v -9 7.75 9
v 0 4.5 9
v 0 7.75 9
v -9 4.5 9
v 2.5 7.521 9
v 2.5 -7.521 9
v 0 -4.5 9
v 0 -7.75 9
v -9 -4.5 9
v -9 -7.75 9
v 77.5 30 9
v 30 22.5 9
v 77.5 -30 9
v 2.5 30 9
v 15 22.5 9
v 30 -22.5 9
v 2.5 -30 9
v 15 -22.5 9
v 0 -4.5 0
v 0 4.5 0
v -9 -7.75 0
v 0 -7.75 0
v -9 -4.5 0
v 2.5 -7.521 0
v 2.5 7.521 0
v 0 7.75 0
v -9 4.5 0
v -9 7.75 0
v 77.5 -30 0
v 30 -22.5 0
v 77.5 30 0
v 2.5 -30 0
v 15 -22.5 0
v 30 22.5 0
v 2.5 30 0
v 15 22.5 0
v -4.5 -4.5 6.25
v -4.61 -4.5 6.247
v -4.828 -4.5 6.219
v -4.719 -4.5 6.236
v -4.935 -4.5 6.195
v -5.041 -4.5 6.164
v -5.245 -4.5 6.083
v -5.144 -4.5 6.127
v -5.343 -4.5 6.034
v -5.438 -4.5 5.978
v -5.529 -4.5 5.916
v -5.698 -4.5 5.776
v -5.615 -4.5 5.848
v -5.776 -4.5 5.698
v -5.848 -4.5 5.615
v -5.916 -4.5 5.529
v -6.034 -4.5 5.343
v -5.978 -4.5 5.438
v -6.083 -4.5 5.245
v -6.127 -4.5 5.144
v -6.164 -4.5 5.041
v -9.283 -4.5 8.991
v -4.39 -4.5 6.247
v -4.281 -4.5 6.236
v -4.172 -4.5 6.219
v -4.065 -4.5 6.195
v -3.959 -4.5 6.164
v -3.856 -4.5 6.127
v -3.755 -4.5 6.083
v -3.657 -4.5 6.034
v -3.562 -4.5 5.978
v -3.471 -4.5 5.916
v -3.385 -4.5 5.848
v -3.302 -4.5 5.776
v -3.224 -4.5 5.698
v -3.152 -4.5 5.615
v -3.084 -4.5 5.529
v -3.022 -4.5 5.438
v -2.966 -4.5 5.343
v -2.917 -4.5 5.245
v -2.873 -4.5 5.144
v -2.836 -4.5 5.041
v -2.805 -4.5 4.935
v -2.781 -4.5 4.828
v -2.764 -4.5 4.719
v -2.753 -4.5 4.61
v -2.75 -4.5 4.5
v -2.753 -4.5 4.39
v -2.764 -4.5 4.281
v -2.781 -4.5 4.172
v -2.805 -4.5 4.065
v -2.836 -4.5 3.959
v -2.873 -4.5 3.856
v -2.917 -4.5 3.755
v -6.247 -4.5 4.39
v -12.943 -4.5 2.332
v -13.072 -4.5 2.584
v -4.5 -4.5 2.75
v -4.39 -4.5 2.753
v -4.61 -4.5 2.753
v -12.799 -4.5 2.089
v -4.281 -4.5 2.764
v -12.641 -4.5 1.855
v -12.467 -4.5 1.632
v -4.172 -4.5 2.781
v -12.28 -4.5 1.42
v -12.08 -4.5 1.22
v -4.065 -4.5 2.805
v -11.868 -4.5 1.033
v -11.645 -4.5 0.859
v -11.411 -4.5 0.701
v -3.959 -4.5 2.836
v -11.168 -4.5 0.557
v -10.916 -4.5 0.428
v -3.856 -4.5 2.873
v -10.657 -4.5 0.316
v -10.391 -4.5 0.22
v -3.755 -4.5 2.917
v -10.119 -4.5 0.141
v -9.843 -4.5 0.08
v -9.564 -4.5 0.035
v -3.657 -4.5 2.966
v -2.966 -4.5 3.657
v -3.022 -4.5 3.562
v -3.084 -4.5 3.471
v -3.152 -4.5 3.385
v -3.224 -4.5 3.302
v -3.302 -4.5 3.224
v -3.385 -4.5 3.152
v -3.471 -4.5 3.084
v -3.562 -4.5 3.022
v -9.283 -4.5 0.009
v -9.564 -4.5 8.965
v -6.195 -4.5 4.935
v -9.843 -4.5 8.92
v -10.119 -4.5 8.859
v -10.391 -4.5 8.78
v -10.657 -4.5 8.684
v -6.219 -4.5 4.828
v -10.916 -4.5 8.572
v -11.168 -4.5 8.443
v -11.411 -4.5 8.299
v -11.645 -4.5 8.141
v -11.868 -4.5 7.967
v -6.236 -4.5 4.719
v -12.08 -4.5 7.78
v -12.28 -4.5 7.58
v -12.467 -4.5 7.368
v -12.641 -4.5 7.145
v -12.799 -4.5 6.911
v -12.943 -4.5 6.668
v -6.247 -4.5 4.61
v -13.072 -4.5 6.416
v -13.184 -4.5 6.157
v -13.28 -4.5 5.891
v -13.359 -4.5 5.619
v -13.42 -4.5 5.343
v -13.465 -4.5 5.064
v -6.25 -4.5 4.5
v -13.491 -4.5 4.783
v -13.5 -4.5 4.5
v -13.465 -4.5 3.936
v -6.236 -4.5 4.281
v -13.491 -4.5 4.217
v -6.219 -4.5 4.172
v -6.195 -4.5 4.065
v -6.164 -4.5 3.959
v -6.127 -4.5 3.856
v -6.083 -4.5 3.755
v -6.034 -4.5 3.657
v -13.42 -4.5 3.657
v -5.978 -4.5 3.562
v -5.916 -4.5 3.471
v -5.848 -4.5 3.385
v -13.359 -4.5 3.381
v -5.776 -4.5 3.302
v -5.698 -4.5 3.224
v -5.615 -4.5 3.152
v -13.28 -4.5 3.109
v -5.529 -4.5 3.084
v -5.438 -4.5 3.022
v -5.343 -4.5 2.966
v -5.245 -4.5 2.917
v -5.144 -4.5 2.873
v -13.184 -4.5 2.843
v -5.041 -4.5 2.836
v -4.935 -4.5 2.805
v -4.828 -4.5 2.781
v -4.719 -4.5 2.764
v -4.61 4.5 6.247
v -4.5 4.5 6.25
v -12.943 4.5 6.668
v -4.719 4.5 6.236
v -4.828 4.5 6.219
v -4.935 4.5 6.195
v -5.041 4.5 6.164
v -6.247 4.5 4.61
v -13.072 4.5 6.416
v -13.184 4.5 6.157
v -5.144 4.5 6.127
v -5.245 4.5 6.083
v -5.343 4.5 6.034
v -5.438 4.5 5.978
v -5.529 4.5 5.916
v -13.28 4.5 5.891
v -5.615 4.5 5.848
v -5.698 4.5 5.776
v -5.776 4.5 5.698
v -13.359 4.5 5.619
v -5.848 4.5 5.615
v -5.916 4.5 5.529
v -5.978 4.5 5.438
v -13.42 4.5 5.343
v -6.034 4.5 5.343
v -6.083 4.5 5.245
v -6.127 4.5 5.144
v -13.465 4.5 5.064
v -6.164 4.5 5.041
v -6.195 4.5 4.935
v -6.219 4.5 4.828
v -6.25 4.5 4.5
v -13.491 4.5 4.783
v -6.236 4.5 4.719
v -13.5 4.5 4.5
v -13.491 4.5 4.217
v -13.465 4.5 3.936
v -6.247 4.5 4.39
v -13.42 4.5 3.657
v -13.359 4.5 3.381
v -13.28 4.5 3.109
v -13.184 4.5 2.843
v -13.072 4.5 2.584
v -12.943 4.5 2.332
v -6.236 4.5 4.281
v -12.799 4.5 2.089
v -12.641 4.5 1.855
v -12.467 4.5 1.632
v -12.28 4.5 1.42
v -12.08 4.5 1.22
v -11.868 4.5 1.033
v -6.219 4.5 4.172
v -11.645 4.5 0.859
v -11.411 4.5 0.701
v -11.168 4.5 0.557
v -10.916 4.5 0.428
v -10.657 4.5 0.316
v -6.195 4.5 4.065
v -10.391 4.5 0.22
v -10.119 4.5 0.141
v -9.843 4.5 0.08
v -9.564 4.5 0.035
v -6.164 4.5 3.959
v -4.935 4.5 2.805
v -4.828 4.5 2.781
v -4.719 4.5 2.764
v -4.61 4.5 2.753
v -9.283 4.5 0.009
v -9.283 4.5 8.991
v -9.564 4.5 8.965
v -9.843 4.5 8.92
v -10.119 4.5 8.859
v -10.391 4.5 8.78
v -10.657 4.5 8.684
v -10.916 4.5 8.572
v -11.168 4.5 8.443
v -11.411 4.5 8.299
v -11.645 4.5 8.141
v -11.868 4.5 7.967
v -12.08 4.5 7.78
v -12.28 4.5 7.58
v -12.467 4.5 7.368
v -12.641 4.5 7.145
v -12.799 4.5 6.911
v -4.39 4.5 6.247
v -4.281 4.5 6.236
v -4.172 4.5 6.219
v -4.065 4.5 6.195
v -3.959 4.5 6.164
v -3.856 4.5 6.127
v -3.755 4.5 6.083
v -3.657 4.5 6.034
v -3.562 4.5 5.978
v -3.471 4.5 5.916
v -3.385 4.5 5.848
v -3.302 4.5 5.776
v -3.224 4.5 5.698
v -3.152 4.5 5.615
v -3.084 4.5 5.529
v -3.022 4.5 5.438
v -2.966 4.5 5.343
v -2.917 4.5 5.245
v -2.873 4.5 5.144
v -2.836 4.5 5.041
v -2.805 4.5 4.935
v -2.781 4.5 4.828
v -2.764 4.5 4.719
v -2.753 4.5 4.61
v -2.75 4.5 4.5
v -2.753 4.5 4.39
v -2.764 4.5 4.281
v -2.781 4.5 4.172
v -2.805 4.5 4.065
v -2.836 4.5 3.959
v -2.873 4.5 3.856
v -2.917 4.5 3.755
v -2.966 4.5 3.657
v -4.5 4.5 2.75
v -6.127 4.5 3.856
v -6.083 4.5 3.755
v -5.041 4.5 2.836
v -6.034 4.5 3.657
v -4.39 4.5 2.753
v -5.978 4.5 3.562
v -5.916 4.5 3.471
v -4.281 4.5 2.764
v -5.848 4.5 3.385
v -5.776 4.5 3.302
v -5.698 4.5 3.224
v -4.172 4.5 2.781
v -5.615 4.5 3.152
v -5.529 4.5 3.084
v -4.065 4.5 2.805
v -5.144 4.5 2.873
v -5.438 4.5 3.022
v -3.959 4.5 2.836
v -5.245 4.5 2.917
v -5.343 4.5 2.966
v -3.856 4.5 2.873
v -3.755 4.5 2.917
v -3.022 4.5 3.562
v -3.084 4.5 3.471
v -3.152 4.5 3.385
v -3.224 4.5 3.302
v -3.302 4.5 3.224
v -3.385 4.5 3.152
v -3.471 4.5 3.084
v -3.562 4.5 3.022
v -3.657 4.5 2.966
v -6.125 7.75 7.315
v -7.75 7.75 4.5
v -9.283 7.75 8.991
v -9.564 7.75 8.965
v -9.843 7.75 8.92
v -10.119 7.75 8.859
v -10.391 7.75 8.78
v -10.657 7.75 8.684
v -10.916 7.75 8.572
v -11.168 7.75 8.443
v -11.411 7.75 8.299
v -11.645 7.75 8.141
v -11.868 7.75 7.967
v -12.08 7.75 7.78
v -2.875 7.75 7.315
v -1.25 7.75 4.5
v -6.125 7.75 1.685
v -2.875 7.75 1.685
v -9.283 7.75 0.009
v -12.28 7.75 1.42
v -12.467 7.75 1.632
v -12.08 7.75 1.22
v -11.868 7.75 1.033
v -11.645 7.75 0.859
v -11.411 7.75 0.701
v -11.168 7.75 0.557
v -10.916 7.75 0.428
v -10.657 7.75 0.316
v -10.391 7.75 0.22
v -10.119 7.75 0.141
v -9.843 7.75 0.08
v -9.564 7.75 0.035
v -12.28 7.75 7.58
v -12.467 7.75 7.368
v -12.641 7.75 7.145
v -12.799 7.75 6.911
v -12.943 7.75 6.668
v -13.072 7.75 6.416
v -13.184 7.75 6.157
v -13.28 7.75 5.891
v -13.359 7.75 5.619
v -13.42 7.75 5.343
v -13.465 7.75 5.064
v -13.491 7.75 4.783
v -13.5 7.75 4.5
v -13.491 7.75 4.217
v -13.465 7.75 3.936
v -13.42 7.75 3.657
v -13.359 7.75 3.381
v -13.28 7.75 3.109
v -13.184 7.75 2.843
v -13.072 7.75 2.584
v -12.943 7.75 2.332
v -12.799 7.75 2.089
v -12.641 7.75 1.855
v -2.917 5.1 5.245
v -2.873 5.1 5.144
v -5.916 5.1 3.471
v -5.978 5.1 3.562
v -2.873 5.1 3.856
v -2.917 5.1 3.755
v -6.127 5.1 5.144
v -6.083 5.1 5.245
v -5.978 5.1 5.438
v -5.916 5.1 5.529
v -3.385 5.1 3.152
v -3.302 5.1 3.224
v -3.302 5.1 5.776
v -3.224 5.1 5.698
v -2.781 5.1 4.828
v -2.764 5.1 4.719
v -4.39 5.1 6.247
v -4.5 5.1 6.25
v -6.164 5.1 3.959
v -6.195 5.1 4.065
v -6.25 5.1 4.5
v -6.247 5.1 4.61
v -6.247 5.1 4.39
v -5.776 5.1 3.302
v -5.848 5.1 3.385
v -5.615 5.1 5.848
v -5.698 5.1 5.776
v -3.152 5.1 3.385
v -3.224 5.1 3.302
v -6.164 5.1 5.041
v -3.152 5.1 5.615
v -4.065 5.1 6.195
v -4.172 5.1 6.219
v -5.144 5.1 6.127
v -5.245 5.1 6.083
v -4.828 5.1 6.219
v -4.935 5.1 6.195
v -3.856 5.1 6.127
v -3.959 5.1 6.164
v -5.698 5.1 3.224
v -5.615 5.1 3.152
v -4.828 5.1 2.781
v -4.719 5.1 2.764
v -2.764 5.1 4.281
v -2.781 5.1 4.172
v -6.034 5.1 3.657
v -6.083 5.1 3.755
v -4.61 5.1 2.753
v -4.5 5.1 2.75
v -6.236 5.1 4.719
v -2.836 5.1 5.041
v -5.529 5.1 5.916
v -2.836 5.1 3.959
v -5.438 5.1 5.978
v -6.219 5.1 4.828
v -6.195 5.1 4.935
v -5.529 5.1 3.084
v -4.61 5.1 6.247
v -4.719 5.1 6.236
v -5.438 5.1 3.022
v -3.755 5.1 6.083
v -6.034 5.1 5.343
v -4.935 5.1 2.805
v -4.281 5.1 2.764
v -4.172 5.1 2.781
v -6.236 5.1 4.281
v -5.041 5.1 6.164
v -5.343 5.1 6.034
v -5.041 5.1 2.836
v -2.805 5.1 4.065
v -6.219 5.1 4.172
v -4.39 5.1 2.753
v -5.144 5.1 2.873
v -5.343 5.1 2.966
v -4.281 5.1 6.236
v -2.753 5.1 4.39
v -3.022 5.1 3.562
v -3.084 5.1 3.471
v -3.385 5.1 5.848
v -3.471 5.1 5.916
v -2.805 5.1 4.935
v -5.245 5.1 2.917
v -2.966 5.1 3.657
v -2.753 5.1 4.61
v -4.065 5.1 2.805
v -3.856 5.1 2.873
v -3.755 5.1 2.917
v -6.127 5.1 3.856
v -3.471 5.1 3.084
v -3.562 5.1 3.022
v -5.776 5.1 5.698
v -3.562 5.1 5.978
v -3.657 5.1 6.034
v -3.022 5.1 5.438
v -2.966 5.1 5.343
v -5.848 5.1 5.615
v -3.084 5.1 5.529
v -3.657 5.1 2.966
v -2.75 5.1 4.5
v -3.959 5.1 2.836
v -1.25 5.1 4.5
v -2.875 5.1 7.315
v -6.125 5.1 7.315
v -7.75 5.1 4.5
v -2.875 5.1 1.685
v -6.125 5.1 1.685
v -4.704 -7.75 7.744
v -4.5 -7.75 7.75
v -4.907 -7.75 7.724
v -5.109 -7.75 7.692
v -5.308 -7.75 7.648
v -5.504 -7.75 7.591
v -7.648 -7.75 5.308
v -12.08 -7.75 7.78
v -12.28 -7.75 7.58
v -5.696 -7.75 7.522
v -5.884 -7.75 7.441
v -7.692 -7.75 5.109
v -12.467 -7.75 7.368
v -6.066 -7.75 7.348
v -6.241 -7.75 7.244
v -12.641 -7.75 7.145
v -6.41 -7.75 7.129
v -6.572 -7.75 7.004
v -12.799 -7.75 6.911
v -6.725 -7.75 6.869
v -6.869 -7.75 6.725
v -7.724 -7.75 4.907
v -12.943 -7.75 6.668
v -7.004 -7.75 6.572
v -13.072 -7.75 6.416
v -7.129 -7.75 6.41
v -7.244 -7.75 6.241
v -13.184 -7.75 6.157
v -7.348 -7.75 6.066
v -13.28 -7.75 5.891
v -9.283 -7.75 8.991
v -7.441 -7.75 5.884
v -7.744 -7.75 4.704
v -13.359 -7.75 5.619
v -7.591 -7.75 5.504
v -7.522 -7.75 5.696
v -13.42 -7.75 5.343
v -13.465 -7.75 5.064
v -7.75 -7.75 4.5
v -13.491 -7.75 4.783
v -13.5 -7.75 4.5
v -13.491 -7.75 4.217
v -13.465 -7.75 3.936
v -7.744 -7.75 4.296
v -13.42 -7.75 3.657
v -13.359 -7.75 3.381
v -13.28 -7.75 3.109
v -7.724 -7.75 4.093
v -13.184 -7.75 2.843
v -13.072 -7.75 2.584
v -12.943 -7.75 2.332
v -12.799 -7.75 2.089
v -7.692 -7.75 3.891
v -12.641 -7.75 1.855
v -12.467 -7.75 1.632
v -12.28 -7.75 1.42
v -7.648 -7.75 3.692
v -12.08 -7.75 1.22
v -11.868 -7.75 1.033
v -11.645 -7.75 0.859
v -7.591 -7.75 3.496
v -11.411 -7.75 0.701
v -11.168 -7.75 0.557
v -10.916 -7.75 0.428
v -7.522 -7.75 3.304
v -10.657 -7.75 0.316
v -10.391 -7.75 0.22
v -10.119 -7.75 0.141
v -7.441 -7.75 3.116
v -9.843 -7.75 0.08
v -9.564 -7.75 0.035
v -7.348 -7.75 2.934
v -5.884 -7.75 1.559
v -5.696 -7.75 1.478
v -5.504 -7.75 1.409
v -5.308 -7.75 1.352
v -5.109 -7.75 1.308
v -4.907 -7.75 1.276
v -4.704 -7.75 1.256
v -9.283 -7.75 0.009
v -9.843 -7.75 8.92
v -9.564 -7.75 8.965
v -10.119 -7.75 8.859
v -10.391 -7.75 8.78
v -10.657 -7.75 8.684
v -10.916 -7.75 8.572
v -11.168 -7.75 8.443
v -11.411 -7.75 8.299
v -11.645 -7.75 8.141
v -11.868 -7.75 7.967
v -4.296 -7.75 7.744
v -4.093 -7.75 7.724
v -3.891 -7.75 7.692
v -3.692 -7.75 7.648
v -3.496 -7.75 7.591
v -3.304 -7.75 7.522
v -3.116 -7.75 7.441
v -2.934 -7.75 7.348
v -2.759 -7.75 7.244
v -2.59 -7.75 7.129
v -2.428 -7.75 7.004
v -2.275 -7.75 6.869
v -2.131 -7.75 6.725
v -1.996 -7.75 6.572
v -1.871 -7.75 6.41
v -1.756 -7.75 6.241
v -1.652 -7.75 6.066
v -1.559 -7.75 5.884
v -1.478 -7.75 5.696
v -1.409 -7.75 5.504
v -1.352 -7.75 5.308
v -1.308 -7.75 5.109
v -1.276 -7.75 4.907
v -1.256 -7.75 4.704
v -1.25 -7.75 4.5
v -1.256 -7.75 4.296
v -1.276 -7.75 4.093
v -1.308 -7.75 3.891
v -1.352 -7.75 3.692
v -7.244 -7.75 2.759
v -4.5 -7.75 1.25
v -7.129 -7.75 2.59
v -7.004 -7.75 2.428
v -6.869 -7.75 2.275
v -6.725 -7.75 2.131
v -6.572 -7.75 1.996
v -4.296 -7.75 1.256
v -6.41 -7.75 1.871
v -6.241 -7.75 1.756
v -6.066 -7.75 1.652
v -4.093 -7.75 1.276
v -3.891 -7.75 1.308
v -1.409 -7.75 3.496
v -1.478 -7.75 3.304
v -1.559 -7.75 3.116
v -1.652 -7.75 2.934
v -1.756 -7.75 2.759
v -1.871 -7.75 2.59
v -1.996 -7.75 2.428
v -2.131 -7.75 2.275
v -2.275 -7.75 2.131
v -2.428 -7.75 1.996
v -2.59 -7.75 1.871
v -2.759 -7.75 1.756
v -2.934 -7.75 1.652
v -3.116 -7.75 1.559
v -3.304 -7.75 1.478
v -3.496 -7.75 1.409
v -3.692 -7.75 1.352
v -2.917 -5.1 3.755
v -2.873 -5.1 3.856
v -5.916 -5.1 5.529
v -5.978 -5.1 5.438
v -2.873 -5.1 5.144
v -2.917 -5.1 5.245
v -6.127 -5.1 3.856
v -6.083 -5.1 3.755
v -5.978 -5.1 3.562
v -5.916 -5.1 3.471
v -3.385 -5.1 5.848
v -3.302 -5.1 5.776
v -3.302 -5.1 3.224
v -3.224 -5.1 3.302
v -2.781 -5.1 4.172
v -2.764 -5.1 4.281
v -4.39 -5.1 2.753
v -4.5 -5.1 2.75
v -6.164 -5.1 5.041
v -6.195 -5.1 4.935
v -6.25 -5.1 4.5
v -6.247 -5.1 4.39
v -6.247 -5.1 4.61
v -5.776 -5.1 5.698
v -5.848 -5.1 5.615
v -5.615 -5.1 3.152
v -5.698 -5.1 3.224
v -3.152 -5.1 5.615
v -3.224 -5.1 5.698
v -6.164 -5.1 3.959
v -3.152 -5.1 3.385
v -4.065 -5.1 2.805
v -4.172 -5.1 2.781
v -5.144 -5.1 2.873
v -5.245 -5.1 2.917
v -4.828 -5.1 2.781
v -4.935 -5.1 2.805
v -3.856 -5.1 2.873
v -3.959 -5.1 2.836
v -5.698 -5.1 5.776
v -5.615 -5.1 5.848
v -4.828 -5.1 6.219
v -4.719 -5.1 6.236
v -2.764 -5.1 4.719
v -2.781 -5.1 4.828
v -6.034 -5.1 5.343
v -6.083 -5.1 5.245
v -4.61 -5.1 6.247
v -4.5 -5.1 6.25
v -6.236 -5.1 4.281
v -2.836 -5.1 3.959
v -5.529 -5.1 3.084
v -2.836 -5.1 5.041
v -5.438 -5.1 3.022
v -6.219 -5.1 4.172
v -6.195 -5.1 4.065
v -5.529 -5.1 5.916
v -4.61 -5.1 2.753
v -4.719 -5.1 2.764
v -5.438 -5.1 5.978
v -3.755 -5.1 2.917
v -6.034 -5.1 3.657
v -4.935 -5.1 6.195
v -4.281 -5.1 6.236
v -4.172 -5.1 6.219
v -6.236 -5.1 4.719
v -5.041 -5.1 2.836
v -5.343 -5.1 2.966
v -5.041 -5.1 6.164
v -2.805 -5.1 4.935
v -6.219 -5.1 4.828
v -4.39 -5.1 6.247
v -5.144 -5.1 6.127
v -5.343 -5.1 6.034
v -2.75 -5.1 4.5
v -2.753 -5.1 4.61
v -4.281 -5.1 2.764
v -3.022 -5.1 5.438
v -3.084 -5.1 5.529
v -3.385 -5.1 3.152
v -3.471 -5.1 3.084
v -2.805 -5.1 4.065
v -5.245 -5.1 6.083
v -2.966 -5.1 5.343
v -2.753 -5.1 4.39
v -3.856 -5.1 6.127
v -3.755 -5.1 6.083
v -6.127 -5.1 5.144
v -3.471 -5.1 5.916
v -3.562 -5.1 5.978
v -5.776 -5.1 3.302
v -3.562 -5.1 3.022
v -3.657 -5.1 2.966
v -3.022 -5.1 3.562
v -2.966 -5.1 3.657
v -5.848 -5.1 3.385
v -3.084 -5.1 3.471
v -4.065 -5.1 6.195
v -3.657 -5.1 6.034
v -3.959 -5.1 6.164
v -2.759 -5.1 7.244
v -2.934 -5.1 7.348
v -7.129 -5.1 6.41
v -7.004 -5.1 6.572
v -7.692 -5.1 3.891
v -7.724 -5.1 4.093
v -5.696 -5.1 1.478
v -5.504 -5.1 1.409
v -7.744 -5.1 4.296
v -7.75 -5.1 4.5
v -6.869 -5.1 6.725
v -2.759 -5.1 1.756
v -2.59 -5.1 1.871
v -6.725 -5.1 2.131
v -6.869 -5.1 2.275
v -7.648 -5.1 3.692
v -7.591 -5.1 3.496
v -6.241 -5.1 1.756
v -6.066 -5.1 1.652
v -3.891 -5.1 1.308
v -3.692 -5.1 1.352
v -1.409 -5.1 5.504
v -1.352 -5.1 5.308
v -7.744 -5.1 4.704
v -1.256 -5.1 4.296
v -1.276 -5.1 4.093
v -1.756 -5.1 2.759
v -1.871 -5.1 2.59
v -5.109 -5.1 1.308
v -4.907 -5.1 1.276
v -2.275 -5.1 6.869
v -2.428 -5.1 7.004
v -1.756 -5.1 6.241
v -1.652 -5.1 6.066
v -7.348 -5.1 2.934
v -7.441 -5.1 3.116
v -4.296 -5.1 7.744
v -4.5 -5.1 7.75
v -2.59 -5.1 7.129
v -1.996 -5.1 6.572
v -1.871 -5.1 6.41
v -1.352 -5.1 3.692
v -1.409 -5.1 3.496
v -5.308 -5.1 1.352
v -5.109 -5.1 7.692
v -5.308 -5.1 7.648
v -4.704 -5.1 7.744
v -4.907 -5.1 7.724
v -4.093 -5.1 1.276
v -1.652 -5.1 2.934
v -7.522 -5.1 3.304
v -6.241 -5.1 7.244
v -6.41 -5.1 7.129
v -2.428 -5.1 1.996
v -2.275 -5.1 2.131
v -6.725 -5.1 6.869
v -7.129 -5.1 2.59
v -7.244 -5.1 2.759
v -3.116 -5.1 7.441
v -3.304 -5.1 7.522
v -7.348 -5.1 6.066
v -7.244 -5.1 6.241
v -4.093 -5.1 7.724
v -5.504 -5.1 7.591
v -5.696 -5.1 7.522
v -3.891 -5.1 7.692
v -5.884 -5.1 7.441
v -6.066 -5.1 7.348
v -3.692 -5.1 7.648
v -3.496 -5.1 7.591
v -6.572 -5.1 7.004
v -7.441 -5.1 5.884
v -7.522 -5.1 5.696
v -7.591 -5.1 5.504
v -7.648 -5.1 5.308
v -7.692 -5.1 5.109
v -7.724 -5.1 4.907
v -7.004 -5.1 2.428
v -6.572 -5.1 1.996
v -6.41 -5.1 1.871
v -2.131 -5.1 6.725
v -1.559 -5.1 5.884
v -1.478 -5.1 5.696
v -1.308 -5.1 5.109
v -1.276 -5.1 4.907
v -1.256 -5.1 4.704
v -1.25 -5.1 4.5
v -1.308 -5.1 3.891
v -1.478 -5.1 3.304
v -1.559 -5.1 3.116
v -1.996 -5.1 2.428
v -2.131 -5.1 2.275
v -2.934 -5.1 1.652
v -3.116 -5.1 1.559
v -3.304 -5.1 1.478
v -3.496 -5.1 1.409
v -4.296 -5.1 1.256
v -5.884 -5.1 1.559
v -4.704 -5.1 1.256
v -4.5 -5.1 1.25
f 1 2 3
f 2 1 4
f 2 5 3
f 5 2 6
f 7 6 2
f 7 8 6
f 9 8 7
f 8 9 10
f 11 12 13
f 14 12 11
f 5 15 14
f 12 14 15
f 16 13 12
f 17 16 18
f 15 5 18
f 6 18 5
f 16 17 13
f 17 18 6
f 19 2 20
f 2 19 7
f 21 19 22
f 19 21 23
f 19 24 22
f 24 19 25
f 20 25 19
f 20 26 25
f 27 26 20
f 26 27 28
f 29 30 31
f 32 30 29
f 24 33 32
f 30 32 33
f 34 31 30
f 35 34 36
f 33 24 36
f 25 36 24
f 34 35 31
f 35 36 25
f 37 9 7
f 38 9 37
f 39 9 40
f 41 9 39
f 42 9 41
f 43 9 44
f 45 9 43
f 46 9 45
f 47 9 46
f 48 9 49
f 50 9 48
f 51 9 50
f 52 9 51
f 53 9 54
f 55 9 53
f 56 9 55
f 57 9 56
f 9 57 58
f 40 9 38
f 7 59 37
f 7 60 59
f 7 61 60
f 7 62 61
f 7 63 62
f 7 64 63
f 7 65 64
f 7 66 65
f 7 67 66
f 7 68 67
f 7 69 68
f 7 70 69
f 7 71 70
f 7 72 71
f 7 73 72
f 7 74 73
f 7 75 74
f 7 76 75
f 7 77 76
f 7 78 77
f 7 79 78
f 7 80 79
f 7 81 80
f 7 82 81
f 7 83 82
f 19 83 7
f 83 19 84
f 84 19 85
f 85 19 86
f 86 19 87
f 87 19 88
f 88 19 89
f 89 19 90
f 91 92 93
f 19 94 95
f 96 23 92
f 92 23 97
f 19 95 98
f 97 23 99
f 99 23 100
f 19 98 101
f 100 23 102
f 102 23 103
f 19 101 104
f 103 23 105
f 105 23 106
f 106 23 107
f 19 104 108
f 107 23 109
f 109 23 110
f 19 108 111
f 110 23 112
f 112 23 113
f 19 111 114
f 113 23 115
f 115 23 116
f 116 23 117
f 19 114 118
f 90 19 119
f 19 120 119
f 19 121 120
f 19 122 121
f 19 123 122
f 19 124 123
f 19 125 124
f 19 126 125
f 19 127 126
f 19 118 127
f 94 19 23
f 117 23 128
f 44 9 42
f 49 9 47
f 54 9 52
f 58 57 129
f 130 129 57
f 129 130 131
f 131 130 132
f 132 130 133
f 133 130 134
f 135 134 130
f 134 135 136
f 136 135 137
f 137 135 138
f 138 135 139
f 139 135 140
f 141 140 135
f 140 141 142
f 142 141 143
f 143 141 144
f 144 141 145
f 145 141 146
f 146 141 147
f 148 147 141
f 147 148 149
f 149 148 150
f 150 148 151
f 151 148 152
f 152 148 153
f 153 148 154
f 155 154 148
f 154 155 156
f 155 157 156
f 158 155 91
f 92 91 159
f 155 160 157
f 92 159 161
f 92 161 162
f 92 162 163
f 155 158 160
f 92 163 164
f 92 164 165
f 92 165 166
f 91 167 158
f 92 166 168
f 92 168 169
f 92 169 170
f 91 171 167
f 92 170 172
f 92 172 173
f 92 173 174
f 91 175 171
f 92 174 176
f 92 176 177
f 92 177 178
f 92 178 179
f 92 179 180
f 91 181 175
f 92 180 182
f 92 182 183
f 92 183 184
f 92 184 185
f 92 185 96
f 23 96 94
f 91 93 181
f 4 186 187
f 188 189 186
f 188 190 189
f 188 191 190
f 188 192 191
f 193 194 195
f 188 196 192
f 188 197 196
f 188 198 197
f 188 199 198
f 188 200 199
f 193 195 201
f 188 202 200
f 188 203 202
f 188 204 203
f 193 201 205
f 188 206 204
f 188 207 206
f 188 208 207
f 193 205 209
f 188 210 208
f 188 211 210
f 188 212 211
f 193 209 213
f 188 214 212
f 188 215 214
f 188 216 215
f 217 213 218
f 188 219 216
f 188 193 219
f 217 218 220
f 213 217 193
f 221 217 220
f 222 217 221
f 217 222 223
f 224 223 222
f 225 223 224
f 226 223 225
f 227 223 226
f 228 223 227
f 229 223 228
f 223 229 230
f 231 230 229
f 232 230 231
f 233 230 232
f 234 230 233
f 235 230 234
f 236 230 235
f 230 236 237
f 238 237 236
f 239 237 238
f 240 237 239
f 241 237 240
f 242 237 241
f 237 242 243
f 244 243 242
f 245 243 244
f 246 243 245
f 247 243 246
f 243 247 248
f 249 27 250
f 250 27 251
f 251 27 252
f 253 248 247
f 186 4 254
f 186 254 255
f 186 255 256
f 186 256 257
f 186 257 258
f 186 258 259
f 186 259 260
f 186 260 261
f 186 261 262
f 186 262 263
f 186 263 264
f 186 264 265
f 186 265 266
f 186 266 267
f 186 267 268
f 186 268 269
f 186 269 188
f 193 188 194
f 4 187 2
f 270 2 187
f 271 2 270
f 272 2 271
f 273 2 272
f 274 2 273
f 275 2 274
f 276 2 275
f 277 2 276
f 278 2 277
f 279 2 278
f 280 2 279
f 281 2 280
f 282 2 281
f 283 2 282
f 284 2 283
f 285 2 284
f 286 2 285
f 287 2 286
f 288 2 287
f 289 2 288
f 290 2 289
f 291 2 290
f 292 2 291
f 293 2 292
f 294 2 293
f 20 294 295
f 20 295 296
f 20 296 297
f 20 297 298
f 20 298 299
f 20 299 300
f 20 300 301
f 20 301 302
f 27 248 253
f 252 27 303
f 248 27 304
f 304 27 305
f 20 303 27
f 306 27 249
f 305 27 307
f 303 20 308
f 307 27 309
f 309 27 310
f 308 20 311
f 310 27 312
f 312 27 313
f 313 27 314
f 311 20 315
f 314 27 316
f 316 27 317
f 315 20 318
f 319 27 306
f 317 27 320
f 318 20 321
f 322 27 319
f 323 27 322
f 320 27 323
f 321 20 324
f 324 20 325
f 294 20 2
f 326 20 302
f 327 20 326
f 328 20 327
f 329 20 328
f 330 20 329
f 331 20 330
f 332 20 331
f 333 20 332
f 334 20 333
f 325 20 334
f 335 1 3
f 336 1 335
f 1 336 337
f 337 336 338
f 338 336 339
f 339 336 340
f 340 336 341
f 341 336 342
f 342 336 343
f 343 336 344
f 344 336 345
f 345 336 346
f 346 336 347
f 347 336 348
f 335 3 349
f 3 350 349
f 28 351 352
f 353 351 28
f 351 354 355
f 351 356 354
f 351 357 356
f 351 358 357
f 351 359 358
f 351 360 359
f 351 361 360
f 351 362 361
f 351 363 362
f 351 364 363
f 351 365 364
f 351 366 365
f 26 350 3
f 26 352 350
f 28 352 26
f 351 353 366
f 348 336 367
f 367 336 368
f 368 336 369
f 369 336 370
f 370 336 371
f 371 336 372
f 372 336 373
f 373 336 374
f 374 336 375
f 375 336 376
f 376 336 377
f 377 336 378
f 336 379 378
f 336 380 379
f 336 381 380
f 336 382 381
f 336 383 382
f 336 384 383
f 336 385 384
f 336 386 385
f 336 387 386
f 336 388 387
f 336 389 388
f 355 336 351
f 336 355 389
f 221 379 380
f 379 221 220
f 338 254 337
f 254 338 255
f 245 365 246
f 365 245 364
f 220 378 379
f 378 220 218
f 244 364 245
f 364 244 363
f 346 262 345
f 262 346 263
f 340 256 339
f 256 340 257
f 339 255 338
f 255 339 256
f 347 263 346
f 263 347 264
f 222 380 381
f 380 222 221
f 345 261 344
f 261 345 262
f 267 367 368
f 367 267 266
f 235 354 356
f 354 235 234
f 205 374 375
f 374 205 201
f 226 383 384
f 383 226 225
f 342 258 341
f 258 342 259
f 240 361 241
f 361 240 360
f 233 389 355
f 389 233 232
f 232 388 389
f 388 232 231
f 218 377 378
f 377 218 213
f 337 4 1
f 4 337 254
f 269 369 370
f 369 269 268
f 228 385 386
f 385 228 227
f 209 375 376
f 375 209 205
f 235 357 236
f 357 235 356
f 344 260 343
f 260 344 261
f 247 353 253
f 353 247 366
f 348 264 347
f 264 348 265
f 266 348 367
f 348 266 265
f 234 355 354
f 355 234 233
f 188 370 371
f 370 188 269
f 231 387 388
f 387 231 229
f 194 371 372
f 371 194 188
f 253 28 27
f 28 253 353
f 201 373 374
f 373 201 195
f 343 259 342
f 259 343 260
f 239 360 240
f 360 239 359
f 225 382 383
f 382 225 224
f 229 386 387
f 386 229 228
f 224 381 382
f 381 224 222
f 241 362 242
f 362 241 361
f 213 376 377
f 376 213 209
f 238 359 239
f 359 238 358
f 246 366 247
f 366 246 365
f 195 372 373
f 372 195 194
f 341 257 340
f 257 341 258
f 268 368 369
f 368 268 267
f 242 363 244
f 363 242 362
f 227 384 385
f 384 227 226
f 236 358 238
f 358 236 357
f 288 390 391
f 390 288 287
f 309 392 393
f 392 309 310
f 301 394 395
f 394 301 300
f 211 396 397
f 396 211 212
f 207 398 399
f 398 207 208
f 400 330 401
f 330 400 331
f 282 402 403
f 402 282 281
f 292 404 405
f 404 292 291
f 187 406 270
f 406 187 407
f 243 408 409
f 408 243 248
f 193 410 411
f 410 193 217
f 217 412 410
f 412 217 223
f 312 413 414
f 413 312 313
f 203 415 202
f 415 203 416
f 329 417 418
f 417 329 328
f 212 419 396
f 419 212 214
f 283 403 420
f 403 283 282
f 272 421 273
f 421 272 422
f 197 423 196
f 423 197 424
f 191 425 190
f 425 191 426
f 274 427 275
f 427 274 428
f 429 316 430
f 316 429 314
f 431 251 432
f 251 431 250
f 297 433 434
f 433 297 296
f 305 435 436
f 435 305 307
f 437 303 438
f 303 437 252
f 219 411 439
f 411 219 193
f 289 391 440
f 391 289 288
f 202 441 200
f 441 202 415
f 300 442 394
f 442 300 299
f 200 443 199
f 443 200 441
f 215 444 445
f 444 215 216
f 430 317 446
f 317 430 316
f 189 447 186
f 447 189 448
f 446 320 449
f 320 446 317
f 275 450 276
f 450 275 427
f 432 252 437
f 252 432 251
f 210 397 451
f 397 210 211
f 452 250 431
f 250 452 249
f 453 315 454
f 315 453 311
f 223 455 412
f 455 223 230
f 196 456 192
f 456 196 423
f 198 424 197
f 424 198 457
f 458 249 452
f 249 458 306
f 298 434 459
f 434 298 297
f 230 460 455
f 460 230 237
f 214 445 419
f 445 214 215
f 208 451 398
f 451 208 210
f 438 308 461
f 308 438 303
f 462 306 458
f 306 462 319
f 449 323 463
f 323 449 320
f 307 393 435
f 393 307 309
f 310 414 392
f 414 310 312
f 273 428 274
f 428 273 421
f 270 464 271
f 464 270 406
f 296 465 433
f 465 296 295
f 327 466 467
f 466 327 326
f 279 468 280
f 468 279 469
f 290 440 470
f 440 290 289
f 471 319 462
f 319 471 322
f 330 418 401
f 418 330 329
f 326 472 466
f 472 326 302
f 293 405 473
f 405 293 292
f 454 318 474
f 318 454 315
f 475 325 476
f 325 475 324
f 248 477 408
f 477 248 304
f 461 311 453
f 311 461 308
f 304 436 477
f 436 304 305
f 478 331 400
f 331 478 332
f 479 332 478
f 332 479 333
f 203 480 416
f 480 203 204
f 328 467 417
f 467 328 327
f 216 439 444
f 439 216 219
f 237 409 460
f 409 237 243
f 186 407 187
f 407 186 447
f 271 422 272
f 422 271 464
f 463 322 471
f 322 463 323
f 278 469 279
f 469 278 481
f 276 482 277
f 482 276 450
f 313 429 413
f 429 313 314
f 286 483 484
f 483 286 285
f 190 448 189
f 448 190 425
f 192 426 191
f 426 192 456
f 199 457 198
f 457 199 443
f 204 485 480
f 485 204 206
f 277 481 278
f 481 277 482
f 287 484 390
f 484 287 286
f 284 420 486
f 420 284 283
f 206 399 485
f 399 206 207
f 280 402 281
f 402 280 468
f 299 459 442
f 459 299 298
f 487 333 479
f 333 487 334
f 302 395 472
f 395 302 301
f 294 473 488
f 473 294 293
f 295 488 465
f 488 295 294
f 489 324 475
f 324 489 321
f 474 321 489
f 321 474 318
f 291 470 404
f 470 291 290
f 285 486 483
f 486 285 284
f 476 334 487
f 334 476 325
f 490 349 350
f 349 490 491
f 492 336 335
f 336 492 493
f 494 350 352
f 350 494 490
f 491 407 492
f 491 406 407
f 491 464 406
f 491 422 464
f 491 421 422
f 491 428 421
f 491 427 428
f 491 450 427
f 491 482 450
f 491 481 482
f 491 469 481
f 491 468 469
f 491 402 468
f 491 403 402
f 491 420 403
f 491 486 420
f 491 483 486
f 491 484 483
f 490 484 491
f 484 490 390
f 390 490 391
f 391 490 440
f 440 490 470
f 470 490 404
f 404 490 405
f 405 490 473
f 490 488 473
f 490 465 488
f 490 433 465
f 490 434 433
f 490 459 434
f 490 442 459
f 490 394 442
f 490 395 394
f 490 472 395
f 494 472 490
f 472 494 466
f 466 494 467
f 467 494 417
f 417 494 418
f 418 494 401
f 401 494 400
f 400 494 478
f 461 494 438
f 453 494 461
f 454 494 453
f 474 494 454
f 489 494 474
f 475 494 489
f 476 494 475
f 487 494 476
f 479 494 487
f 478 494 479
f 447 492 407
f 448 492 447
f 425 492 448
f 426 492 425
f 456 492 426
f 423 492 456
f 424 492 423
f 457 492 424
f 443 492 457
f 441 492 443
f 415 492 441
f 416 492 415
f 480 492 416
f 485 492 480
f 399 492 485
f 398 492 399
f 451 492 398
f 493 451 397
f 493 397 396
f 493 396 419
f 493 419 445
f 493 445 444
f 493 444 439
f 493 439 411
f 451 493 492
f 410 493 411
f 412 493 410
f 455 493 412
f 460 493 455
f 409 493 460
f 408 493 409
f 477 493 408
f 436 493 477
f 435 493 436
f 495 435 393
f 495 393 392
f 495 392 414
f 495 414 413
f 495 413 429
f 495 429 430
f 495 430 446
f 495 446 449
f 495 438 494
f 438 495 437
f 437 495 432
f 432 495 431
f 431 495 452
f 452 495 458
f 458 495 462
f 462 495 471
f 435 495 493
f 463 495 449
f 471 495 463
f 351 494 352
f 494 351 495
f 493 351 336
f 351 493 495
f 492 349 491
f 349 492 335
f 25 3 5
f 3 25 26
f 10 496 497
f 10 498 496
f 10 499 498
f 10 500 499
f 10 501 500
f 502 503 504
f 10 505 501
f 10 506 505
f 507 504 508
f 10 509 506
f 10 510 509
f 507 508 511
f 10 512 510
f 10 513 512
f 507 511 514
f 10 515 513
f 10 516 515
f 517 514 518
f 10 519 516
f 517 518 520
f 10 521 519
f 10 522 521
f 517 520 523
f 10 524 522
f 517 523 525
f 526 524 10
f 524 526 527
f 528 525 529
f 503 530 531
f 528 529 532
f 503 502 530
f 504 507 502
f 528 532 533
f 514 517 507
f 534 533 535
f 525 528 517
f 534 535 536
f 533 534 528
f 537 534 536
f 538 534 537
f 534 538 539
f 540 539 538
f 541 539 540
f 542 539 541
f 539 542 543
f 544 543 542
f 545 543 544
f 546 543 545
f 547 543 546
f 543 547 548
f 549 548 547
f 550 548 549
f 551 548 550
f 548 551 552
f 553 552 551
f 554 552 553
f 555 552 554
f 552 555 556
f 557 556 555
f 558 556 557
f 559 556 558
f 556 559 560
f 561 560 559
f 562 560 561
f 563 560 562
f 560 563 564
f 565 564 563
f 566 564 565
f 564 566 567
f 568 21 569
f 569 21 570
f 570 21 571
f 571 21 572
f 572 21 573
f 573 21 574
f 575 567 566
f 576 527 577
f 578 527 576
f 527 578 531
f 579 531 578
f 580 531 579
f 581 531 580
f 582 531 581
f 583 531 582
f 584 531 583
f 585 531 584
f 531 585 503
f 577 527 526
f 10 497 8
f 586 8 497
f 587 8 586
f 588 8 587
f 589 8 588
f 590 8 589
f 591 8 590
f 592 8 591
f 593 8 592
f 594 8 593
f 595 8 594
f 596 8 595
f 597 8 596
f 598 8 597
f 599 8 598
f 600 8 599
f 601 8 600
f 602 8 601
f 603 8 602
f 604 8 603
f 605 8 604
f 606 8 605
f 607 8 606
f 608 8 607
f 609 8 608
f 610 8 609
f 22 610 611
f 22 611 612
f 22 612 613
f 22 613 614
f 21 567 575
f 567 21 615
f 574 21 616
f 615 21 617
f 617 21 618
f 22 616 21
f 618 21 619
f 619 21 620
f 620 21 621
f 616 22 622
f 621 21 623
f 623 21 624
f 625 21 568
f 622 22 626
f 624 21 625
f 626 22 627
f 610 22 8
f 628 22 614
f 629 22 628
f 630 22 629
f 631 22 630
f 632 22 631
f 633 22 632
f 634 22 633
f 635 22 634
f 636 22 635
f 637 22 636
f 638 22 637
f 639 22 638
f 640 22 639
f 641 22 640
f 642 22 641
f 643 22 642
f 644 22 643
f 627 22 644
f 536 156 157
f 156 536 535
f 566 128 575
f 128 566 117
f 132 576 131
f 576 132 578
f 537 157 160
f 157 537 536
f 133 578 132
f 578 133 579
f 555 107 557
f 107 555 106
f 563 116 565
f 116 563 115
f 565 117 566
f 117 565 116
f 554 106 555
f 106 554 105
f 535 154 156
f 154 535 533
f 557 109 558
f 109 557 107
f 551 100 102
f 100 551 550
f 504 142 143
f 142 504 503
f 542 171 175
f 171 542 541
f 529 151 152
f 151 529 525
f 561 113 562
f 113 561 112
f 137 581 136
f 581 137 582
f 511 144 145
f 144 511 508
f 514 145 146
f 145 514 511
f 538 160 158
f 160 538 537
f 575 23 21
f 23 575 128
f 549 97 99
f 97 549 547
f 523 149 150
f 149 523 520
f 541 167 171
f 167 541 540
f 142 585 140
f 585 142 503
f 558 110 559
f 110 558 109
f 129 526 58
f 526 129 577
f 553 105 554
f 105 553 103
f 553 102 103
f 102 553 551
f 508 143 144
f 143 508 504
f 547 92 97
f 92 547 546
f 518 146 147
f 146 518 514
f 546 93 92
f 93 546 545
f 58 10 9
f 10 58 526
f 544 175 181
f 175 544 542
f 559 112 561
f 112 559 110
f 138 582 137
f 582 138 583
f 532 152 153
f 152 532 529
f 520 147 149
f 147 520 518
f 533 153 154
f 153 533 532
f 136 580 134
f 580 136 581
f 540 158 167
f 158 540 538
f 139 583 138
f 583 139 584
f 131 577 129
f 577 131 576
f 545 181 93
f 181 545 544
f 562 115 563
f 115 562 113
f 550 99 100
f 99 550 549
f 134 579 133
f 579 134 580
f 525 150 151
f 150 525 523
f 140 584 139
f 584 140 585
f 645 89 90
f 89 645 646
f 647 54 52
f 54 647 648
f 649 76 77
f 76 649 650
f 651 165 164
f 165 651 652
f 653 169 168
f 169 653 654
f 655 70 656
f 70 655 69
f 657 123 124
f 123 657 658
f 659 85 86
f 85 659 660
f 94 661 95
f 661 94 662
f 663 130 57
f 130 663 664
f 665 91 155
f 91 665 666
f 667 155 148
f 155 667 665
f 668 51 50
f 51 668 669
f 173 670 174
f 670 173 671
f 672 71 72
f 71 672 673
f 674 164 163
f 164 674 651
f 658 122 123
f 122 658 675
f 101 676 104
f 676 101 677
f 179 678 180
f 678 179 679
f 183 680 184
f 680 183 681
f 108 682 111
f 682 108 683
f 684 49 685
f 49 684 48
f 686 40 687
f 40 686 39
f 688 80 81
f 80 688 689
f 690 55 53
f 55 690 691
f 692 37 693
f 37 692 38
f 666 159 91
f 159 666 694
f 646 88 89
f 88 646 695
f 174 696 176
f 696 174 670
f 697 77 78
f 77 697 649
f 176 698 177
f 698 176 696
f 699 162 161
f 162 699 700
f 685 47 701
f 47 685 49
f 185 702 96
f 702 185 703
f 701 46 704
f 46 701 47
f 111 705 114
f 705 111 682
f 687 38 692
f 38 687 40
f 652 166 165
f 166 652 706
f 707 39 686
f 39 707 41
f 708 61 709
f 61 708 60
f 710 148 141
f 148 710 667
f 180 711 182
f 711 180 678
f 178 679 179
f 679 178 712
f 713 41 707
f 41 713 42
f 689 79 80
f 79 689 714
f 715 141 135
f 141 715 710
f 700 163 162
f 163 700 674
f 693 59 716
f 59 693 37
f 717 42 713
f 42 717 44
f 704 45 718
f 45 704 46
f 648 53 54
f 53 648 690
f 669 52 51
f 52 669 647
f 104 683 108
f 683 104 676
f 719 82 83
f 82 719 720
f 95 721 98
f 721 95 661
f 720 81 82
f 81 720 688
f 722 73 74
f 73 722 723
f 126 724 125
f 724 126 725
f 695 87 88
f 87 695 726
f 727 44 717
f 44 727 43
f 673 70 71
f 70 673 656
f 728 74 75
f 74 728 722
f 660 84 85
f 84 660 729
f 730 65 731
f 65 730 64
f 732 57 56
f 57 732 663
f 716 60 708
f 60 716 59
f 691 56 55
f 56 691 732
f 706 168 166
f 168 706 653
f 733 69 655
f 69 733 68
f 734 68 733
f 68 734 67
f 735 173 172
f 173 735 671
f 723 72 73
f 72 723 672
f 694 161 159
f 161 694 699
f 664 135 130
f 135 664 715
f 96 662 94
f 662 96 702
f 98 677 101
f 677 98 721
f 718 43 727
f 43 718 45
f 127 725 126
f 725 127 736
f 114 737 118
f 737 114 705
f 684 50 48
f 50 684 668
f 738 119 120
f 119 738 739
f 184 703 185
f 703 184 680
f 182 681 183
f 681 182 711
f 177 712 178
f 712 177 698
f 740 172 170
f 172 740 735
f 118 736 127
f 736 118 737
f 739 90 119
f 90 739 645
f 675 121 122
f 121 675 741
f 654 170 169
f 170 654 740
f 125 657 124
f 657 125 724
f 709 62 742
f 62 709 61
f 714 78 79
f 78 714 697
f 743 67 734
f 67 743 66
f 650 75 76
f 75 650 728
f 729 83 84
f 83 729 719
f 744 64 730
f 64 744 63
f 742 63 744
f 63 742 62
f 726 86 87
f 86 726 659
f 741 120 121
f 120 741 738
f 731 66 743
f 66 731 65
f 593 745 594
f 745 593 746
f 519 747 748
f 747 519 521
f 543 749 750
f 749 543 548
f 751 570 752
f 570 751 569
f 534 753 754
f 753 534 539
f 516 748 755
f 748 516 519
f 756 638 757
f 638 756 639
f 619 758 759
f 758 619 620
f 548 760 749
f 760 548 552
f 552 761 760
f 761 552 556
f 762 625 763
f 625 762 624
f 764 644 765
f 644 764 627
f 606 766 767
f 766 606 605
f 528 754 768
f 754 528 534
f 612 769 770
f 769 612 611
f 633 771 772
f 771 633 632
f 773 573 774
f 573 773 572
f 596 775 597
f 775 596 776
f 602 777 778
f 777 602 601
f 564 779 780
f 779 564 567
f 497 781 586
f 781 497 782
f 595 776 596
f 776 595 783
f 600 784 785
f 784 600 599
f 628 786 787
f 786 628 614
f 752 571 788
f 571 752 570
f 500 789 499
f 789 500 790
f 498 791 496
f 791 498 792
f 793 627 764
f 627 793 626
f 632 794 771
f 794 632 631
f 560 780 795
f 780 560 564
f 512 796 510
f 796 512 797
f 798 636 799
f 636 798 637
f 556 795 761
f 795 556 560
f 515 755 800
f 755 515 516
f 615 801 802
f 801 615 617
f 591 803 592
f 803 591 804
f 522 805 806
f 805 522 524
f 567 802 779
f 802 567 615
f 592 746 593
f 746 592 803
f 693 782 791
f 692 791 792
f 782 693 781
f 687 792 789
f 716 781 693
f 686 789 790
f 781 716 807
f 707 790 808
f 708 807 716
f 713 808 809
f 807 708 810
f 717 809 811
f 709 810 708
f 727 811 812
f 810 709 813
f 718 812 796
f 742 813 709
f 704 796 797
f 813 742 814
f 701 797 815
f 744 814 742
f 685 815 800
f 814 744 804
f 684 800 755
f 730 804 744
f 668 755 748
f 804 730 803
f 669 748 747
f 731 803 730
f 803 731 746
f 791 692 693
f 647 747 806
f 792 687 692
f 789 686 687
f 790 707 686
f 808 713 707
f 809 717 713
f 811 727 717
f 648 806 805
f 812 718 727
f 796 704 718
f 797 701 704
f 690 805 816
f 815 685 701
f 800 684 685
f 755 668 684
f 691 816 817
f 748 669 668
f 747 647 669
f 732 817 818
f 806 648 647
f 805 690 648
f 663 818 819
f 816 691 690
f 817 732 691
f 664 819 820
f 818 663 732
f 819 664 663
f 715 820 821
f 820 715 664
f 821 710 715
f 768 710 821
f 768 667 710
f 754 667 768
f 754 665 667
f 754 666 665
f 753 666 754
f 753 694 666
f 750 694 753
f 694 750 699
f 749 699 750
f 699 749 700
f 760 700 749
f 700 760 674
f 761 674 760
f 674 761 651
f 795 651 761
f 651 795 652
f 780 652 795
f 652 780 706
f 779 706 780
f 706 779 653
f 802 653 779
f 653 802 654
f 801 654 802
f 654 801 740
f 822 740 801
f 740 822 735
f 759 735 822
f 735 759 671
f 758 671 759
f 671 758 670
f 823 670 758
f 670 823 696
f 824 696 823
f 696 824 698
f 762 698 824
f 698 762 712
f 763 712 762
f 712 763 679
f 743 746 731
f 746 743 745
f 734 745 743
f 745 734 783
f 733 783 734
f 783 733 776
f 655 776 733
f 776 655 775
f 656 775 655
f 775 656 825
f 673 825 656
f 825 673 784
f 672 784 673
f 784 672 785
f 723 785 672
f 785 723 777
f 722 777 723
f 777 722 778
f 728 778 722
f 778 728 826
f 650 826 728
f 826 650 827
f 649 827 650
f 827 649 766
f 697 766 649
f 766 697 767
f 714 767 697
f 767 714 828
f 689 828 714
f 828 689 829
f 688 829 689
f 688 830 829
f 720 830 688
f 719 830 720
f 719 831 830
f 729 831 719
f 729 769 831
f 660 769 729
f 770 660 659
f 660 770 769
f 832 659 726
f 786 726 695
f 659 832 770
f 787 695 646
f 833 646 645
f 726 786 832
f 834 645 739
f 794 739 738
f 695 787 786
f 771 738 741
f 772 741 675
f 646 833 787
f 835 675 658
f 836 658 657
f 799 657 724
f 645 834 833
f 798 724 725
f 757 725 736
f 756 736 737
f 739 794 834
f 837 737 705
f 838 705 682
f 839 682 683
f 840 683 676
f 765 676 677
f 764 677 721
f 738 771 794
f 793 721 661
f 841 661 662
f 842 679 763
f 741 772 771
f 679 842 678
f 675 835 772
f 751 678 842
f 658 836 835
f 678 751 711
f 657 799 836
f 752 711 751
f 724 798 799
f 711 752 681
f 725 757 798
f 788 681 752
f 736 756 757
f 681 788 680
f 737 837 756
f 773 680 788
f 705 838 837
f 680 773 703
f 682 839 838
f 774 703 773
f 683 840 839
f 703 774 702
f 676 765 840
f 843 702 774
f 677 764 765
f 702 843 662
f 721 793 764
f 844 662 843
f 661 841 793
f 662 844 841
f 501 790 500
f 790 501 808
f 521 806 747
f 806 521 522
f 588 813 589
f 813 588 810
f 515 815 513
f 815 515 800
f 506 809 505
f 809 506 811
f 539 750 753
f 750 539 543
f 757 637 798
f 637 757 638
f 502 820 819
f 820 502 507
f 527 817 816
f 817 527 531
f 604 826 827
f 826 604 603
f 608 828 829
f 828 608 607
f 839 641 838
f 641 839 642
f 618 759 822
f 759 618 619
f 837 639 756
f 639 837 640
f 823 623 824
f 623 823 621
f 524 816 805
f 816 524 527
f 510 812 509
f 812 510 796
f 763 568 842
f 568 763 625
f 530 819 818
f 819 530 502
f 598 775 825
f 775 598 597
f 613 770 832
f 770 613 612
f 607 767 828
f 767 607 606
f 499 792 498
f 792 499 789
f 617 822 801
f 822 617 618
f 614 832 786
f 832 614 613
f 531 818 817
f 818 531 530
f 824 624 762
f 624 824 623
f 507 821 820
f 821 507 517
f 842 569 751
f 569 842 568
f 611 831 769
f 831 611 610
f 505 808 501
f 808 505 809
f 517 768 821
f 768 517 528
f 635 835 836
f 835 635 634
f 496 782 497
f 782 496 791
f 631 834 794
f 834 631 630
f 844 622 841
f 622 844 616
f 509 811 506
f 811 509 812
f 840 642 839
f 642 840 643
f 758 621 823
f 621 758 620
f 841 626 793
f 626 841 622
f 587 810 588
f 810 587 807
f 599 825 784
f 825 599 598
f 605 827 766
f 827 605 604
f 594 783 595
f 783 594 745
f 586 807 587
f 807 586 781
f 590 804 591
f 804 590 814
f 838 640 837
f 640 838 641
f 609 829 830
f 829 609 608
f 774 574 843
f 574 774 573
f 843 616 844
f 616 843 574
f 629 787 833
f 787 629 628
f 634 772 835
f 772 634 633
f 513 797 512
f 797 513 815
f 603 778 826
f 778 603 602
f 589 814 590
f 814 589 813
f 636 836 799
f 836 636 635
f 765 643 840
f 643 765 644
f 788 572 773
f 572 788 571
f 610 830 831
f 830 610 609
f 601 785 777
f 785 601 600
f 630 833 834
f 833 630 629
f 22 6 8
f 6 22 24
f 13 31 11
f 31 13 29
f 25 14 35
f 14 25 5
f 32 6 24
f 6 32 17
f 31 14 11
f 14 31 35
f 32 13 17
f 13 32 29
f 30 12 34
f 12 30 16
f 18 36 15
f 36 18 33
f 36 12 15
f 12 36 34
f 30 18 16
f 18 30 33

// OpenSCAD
// file: arm.scad
// A flexible arm structure that can reach out to different distances and hold something at the end of the arm.
// The arm-joint haves one degree of freedom and fixed using M3 screws.

W = 9; // the width of the arm
L = 40; // the length of the arm
d = 0.1; // delta width to add to embrace the edges
$fn = 100;

// metric M3 bolt, sizes are from https://www.engineersedge.com/hardware/standard_metric_hex_nuts_13728.htm
M = 3; // the size of the bolt
dm = 0.5; // the delta size of the bolthole
Smin = 6.5; // nut S size min
Smax = 6.5;  // nut S size max
Mmax = 2.55;

K = Mmax + 0.7; // width of the wall
Se = W ; //length of the wall hanging out
Si = L - W / 2; // length of the wall inside

module wall(z = 6) {
    difference() {
        union() {
            translate([0, 0, - Se])
                cube([K, W, Se]);
            translate([0, W / 2, - Se])
                rotate([0, 90, 0])
                    cylinder(K, W / 2, W / 2);
        }
        union() {
            // the bolt hole at the bottom
            translate([- d, W / 2, - W / 2])
                rotate([0, 90, 0])
                    cylinder(K + 2 * d, d = M + dm);
            translate([K - Mmax - d, W / 2, - W / 2])
                rotate([0, 90, 0])
                    cylinder(Mmax + 2 * d, d1 = Smin, d2 = Smax, $fn = z);
        }
    }
    polyhedron(
    points = [[0, 0, 0], [0, W, 0], [+ K, 0, 0], [+ K, W, 0], [0, 0, Si], [0, W, Si]],
    faces = [[0, 2, 3, 1], [0, 4, 2], [1, 3, 5], [0, 1, 5, 4], [4, 5, 3, 2]], convexity = 10
    );
}
module arm(EXT = 0) {
    L = L + EXT;
    difference() {

        union() {
            difference() {
                union() {
                    cube([W, W, L]);
                    translate([0, W / 2, L])
                        rotate([0, 90, 0])
                            cylinder(W, W / 2, W / 2);
                }

                difference() {
                    translate([- d, 0, L])
                        cube([W + 2 * d, W, W / 2]);
                    translate([W / 2, W + d, L])
                        rotate([90, 90, 0])
                            cylinder(W + 2 * d, W / 2, W / 2);
                }
            }

            // the wall on one side
            rotate([0, 0, - 90,])
                wall();

            // the wall on the other side
            translate([W, W, 0])
                rotate([0, 0, 90,])
                    wall(z = 100);
        }

        // the bolt holes at the top
        translate([W / 2, - K - d, L])
            rotate([0, 90, 90])
                cylinder(W + 2 * K + 2 * d, d1 = M + dm, d2 = M + dm);

        translate([- d, W / 2 - d, L])
            rotate([0, 90, 0])
                cylinder(W + 2 * K + 2 * d, d1 = M + dm, d2 = M + dm);
    }
}

arm(10);
// main file
use <arm.scad>;

W = 45;
L = 45;
d = 15;
$fn = 100;

translate([40, - 0, 4.5])
    difference() {
        union() {
            cube([L + 2 * d, W + d, 9], center = true);
            translate([- 40, 4.5, - 4.5])
                rotate([0, - 90, 180])
                    arm();
        }
        translate([- W / 2 + 5, 0, 0])
            cube([d, W, 11], center = true);
    }
